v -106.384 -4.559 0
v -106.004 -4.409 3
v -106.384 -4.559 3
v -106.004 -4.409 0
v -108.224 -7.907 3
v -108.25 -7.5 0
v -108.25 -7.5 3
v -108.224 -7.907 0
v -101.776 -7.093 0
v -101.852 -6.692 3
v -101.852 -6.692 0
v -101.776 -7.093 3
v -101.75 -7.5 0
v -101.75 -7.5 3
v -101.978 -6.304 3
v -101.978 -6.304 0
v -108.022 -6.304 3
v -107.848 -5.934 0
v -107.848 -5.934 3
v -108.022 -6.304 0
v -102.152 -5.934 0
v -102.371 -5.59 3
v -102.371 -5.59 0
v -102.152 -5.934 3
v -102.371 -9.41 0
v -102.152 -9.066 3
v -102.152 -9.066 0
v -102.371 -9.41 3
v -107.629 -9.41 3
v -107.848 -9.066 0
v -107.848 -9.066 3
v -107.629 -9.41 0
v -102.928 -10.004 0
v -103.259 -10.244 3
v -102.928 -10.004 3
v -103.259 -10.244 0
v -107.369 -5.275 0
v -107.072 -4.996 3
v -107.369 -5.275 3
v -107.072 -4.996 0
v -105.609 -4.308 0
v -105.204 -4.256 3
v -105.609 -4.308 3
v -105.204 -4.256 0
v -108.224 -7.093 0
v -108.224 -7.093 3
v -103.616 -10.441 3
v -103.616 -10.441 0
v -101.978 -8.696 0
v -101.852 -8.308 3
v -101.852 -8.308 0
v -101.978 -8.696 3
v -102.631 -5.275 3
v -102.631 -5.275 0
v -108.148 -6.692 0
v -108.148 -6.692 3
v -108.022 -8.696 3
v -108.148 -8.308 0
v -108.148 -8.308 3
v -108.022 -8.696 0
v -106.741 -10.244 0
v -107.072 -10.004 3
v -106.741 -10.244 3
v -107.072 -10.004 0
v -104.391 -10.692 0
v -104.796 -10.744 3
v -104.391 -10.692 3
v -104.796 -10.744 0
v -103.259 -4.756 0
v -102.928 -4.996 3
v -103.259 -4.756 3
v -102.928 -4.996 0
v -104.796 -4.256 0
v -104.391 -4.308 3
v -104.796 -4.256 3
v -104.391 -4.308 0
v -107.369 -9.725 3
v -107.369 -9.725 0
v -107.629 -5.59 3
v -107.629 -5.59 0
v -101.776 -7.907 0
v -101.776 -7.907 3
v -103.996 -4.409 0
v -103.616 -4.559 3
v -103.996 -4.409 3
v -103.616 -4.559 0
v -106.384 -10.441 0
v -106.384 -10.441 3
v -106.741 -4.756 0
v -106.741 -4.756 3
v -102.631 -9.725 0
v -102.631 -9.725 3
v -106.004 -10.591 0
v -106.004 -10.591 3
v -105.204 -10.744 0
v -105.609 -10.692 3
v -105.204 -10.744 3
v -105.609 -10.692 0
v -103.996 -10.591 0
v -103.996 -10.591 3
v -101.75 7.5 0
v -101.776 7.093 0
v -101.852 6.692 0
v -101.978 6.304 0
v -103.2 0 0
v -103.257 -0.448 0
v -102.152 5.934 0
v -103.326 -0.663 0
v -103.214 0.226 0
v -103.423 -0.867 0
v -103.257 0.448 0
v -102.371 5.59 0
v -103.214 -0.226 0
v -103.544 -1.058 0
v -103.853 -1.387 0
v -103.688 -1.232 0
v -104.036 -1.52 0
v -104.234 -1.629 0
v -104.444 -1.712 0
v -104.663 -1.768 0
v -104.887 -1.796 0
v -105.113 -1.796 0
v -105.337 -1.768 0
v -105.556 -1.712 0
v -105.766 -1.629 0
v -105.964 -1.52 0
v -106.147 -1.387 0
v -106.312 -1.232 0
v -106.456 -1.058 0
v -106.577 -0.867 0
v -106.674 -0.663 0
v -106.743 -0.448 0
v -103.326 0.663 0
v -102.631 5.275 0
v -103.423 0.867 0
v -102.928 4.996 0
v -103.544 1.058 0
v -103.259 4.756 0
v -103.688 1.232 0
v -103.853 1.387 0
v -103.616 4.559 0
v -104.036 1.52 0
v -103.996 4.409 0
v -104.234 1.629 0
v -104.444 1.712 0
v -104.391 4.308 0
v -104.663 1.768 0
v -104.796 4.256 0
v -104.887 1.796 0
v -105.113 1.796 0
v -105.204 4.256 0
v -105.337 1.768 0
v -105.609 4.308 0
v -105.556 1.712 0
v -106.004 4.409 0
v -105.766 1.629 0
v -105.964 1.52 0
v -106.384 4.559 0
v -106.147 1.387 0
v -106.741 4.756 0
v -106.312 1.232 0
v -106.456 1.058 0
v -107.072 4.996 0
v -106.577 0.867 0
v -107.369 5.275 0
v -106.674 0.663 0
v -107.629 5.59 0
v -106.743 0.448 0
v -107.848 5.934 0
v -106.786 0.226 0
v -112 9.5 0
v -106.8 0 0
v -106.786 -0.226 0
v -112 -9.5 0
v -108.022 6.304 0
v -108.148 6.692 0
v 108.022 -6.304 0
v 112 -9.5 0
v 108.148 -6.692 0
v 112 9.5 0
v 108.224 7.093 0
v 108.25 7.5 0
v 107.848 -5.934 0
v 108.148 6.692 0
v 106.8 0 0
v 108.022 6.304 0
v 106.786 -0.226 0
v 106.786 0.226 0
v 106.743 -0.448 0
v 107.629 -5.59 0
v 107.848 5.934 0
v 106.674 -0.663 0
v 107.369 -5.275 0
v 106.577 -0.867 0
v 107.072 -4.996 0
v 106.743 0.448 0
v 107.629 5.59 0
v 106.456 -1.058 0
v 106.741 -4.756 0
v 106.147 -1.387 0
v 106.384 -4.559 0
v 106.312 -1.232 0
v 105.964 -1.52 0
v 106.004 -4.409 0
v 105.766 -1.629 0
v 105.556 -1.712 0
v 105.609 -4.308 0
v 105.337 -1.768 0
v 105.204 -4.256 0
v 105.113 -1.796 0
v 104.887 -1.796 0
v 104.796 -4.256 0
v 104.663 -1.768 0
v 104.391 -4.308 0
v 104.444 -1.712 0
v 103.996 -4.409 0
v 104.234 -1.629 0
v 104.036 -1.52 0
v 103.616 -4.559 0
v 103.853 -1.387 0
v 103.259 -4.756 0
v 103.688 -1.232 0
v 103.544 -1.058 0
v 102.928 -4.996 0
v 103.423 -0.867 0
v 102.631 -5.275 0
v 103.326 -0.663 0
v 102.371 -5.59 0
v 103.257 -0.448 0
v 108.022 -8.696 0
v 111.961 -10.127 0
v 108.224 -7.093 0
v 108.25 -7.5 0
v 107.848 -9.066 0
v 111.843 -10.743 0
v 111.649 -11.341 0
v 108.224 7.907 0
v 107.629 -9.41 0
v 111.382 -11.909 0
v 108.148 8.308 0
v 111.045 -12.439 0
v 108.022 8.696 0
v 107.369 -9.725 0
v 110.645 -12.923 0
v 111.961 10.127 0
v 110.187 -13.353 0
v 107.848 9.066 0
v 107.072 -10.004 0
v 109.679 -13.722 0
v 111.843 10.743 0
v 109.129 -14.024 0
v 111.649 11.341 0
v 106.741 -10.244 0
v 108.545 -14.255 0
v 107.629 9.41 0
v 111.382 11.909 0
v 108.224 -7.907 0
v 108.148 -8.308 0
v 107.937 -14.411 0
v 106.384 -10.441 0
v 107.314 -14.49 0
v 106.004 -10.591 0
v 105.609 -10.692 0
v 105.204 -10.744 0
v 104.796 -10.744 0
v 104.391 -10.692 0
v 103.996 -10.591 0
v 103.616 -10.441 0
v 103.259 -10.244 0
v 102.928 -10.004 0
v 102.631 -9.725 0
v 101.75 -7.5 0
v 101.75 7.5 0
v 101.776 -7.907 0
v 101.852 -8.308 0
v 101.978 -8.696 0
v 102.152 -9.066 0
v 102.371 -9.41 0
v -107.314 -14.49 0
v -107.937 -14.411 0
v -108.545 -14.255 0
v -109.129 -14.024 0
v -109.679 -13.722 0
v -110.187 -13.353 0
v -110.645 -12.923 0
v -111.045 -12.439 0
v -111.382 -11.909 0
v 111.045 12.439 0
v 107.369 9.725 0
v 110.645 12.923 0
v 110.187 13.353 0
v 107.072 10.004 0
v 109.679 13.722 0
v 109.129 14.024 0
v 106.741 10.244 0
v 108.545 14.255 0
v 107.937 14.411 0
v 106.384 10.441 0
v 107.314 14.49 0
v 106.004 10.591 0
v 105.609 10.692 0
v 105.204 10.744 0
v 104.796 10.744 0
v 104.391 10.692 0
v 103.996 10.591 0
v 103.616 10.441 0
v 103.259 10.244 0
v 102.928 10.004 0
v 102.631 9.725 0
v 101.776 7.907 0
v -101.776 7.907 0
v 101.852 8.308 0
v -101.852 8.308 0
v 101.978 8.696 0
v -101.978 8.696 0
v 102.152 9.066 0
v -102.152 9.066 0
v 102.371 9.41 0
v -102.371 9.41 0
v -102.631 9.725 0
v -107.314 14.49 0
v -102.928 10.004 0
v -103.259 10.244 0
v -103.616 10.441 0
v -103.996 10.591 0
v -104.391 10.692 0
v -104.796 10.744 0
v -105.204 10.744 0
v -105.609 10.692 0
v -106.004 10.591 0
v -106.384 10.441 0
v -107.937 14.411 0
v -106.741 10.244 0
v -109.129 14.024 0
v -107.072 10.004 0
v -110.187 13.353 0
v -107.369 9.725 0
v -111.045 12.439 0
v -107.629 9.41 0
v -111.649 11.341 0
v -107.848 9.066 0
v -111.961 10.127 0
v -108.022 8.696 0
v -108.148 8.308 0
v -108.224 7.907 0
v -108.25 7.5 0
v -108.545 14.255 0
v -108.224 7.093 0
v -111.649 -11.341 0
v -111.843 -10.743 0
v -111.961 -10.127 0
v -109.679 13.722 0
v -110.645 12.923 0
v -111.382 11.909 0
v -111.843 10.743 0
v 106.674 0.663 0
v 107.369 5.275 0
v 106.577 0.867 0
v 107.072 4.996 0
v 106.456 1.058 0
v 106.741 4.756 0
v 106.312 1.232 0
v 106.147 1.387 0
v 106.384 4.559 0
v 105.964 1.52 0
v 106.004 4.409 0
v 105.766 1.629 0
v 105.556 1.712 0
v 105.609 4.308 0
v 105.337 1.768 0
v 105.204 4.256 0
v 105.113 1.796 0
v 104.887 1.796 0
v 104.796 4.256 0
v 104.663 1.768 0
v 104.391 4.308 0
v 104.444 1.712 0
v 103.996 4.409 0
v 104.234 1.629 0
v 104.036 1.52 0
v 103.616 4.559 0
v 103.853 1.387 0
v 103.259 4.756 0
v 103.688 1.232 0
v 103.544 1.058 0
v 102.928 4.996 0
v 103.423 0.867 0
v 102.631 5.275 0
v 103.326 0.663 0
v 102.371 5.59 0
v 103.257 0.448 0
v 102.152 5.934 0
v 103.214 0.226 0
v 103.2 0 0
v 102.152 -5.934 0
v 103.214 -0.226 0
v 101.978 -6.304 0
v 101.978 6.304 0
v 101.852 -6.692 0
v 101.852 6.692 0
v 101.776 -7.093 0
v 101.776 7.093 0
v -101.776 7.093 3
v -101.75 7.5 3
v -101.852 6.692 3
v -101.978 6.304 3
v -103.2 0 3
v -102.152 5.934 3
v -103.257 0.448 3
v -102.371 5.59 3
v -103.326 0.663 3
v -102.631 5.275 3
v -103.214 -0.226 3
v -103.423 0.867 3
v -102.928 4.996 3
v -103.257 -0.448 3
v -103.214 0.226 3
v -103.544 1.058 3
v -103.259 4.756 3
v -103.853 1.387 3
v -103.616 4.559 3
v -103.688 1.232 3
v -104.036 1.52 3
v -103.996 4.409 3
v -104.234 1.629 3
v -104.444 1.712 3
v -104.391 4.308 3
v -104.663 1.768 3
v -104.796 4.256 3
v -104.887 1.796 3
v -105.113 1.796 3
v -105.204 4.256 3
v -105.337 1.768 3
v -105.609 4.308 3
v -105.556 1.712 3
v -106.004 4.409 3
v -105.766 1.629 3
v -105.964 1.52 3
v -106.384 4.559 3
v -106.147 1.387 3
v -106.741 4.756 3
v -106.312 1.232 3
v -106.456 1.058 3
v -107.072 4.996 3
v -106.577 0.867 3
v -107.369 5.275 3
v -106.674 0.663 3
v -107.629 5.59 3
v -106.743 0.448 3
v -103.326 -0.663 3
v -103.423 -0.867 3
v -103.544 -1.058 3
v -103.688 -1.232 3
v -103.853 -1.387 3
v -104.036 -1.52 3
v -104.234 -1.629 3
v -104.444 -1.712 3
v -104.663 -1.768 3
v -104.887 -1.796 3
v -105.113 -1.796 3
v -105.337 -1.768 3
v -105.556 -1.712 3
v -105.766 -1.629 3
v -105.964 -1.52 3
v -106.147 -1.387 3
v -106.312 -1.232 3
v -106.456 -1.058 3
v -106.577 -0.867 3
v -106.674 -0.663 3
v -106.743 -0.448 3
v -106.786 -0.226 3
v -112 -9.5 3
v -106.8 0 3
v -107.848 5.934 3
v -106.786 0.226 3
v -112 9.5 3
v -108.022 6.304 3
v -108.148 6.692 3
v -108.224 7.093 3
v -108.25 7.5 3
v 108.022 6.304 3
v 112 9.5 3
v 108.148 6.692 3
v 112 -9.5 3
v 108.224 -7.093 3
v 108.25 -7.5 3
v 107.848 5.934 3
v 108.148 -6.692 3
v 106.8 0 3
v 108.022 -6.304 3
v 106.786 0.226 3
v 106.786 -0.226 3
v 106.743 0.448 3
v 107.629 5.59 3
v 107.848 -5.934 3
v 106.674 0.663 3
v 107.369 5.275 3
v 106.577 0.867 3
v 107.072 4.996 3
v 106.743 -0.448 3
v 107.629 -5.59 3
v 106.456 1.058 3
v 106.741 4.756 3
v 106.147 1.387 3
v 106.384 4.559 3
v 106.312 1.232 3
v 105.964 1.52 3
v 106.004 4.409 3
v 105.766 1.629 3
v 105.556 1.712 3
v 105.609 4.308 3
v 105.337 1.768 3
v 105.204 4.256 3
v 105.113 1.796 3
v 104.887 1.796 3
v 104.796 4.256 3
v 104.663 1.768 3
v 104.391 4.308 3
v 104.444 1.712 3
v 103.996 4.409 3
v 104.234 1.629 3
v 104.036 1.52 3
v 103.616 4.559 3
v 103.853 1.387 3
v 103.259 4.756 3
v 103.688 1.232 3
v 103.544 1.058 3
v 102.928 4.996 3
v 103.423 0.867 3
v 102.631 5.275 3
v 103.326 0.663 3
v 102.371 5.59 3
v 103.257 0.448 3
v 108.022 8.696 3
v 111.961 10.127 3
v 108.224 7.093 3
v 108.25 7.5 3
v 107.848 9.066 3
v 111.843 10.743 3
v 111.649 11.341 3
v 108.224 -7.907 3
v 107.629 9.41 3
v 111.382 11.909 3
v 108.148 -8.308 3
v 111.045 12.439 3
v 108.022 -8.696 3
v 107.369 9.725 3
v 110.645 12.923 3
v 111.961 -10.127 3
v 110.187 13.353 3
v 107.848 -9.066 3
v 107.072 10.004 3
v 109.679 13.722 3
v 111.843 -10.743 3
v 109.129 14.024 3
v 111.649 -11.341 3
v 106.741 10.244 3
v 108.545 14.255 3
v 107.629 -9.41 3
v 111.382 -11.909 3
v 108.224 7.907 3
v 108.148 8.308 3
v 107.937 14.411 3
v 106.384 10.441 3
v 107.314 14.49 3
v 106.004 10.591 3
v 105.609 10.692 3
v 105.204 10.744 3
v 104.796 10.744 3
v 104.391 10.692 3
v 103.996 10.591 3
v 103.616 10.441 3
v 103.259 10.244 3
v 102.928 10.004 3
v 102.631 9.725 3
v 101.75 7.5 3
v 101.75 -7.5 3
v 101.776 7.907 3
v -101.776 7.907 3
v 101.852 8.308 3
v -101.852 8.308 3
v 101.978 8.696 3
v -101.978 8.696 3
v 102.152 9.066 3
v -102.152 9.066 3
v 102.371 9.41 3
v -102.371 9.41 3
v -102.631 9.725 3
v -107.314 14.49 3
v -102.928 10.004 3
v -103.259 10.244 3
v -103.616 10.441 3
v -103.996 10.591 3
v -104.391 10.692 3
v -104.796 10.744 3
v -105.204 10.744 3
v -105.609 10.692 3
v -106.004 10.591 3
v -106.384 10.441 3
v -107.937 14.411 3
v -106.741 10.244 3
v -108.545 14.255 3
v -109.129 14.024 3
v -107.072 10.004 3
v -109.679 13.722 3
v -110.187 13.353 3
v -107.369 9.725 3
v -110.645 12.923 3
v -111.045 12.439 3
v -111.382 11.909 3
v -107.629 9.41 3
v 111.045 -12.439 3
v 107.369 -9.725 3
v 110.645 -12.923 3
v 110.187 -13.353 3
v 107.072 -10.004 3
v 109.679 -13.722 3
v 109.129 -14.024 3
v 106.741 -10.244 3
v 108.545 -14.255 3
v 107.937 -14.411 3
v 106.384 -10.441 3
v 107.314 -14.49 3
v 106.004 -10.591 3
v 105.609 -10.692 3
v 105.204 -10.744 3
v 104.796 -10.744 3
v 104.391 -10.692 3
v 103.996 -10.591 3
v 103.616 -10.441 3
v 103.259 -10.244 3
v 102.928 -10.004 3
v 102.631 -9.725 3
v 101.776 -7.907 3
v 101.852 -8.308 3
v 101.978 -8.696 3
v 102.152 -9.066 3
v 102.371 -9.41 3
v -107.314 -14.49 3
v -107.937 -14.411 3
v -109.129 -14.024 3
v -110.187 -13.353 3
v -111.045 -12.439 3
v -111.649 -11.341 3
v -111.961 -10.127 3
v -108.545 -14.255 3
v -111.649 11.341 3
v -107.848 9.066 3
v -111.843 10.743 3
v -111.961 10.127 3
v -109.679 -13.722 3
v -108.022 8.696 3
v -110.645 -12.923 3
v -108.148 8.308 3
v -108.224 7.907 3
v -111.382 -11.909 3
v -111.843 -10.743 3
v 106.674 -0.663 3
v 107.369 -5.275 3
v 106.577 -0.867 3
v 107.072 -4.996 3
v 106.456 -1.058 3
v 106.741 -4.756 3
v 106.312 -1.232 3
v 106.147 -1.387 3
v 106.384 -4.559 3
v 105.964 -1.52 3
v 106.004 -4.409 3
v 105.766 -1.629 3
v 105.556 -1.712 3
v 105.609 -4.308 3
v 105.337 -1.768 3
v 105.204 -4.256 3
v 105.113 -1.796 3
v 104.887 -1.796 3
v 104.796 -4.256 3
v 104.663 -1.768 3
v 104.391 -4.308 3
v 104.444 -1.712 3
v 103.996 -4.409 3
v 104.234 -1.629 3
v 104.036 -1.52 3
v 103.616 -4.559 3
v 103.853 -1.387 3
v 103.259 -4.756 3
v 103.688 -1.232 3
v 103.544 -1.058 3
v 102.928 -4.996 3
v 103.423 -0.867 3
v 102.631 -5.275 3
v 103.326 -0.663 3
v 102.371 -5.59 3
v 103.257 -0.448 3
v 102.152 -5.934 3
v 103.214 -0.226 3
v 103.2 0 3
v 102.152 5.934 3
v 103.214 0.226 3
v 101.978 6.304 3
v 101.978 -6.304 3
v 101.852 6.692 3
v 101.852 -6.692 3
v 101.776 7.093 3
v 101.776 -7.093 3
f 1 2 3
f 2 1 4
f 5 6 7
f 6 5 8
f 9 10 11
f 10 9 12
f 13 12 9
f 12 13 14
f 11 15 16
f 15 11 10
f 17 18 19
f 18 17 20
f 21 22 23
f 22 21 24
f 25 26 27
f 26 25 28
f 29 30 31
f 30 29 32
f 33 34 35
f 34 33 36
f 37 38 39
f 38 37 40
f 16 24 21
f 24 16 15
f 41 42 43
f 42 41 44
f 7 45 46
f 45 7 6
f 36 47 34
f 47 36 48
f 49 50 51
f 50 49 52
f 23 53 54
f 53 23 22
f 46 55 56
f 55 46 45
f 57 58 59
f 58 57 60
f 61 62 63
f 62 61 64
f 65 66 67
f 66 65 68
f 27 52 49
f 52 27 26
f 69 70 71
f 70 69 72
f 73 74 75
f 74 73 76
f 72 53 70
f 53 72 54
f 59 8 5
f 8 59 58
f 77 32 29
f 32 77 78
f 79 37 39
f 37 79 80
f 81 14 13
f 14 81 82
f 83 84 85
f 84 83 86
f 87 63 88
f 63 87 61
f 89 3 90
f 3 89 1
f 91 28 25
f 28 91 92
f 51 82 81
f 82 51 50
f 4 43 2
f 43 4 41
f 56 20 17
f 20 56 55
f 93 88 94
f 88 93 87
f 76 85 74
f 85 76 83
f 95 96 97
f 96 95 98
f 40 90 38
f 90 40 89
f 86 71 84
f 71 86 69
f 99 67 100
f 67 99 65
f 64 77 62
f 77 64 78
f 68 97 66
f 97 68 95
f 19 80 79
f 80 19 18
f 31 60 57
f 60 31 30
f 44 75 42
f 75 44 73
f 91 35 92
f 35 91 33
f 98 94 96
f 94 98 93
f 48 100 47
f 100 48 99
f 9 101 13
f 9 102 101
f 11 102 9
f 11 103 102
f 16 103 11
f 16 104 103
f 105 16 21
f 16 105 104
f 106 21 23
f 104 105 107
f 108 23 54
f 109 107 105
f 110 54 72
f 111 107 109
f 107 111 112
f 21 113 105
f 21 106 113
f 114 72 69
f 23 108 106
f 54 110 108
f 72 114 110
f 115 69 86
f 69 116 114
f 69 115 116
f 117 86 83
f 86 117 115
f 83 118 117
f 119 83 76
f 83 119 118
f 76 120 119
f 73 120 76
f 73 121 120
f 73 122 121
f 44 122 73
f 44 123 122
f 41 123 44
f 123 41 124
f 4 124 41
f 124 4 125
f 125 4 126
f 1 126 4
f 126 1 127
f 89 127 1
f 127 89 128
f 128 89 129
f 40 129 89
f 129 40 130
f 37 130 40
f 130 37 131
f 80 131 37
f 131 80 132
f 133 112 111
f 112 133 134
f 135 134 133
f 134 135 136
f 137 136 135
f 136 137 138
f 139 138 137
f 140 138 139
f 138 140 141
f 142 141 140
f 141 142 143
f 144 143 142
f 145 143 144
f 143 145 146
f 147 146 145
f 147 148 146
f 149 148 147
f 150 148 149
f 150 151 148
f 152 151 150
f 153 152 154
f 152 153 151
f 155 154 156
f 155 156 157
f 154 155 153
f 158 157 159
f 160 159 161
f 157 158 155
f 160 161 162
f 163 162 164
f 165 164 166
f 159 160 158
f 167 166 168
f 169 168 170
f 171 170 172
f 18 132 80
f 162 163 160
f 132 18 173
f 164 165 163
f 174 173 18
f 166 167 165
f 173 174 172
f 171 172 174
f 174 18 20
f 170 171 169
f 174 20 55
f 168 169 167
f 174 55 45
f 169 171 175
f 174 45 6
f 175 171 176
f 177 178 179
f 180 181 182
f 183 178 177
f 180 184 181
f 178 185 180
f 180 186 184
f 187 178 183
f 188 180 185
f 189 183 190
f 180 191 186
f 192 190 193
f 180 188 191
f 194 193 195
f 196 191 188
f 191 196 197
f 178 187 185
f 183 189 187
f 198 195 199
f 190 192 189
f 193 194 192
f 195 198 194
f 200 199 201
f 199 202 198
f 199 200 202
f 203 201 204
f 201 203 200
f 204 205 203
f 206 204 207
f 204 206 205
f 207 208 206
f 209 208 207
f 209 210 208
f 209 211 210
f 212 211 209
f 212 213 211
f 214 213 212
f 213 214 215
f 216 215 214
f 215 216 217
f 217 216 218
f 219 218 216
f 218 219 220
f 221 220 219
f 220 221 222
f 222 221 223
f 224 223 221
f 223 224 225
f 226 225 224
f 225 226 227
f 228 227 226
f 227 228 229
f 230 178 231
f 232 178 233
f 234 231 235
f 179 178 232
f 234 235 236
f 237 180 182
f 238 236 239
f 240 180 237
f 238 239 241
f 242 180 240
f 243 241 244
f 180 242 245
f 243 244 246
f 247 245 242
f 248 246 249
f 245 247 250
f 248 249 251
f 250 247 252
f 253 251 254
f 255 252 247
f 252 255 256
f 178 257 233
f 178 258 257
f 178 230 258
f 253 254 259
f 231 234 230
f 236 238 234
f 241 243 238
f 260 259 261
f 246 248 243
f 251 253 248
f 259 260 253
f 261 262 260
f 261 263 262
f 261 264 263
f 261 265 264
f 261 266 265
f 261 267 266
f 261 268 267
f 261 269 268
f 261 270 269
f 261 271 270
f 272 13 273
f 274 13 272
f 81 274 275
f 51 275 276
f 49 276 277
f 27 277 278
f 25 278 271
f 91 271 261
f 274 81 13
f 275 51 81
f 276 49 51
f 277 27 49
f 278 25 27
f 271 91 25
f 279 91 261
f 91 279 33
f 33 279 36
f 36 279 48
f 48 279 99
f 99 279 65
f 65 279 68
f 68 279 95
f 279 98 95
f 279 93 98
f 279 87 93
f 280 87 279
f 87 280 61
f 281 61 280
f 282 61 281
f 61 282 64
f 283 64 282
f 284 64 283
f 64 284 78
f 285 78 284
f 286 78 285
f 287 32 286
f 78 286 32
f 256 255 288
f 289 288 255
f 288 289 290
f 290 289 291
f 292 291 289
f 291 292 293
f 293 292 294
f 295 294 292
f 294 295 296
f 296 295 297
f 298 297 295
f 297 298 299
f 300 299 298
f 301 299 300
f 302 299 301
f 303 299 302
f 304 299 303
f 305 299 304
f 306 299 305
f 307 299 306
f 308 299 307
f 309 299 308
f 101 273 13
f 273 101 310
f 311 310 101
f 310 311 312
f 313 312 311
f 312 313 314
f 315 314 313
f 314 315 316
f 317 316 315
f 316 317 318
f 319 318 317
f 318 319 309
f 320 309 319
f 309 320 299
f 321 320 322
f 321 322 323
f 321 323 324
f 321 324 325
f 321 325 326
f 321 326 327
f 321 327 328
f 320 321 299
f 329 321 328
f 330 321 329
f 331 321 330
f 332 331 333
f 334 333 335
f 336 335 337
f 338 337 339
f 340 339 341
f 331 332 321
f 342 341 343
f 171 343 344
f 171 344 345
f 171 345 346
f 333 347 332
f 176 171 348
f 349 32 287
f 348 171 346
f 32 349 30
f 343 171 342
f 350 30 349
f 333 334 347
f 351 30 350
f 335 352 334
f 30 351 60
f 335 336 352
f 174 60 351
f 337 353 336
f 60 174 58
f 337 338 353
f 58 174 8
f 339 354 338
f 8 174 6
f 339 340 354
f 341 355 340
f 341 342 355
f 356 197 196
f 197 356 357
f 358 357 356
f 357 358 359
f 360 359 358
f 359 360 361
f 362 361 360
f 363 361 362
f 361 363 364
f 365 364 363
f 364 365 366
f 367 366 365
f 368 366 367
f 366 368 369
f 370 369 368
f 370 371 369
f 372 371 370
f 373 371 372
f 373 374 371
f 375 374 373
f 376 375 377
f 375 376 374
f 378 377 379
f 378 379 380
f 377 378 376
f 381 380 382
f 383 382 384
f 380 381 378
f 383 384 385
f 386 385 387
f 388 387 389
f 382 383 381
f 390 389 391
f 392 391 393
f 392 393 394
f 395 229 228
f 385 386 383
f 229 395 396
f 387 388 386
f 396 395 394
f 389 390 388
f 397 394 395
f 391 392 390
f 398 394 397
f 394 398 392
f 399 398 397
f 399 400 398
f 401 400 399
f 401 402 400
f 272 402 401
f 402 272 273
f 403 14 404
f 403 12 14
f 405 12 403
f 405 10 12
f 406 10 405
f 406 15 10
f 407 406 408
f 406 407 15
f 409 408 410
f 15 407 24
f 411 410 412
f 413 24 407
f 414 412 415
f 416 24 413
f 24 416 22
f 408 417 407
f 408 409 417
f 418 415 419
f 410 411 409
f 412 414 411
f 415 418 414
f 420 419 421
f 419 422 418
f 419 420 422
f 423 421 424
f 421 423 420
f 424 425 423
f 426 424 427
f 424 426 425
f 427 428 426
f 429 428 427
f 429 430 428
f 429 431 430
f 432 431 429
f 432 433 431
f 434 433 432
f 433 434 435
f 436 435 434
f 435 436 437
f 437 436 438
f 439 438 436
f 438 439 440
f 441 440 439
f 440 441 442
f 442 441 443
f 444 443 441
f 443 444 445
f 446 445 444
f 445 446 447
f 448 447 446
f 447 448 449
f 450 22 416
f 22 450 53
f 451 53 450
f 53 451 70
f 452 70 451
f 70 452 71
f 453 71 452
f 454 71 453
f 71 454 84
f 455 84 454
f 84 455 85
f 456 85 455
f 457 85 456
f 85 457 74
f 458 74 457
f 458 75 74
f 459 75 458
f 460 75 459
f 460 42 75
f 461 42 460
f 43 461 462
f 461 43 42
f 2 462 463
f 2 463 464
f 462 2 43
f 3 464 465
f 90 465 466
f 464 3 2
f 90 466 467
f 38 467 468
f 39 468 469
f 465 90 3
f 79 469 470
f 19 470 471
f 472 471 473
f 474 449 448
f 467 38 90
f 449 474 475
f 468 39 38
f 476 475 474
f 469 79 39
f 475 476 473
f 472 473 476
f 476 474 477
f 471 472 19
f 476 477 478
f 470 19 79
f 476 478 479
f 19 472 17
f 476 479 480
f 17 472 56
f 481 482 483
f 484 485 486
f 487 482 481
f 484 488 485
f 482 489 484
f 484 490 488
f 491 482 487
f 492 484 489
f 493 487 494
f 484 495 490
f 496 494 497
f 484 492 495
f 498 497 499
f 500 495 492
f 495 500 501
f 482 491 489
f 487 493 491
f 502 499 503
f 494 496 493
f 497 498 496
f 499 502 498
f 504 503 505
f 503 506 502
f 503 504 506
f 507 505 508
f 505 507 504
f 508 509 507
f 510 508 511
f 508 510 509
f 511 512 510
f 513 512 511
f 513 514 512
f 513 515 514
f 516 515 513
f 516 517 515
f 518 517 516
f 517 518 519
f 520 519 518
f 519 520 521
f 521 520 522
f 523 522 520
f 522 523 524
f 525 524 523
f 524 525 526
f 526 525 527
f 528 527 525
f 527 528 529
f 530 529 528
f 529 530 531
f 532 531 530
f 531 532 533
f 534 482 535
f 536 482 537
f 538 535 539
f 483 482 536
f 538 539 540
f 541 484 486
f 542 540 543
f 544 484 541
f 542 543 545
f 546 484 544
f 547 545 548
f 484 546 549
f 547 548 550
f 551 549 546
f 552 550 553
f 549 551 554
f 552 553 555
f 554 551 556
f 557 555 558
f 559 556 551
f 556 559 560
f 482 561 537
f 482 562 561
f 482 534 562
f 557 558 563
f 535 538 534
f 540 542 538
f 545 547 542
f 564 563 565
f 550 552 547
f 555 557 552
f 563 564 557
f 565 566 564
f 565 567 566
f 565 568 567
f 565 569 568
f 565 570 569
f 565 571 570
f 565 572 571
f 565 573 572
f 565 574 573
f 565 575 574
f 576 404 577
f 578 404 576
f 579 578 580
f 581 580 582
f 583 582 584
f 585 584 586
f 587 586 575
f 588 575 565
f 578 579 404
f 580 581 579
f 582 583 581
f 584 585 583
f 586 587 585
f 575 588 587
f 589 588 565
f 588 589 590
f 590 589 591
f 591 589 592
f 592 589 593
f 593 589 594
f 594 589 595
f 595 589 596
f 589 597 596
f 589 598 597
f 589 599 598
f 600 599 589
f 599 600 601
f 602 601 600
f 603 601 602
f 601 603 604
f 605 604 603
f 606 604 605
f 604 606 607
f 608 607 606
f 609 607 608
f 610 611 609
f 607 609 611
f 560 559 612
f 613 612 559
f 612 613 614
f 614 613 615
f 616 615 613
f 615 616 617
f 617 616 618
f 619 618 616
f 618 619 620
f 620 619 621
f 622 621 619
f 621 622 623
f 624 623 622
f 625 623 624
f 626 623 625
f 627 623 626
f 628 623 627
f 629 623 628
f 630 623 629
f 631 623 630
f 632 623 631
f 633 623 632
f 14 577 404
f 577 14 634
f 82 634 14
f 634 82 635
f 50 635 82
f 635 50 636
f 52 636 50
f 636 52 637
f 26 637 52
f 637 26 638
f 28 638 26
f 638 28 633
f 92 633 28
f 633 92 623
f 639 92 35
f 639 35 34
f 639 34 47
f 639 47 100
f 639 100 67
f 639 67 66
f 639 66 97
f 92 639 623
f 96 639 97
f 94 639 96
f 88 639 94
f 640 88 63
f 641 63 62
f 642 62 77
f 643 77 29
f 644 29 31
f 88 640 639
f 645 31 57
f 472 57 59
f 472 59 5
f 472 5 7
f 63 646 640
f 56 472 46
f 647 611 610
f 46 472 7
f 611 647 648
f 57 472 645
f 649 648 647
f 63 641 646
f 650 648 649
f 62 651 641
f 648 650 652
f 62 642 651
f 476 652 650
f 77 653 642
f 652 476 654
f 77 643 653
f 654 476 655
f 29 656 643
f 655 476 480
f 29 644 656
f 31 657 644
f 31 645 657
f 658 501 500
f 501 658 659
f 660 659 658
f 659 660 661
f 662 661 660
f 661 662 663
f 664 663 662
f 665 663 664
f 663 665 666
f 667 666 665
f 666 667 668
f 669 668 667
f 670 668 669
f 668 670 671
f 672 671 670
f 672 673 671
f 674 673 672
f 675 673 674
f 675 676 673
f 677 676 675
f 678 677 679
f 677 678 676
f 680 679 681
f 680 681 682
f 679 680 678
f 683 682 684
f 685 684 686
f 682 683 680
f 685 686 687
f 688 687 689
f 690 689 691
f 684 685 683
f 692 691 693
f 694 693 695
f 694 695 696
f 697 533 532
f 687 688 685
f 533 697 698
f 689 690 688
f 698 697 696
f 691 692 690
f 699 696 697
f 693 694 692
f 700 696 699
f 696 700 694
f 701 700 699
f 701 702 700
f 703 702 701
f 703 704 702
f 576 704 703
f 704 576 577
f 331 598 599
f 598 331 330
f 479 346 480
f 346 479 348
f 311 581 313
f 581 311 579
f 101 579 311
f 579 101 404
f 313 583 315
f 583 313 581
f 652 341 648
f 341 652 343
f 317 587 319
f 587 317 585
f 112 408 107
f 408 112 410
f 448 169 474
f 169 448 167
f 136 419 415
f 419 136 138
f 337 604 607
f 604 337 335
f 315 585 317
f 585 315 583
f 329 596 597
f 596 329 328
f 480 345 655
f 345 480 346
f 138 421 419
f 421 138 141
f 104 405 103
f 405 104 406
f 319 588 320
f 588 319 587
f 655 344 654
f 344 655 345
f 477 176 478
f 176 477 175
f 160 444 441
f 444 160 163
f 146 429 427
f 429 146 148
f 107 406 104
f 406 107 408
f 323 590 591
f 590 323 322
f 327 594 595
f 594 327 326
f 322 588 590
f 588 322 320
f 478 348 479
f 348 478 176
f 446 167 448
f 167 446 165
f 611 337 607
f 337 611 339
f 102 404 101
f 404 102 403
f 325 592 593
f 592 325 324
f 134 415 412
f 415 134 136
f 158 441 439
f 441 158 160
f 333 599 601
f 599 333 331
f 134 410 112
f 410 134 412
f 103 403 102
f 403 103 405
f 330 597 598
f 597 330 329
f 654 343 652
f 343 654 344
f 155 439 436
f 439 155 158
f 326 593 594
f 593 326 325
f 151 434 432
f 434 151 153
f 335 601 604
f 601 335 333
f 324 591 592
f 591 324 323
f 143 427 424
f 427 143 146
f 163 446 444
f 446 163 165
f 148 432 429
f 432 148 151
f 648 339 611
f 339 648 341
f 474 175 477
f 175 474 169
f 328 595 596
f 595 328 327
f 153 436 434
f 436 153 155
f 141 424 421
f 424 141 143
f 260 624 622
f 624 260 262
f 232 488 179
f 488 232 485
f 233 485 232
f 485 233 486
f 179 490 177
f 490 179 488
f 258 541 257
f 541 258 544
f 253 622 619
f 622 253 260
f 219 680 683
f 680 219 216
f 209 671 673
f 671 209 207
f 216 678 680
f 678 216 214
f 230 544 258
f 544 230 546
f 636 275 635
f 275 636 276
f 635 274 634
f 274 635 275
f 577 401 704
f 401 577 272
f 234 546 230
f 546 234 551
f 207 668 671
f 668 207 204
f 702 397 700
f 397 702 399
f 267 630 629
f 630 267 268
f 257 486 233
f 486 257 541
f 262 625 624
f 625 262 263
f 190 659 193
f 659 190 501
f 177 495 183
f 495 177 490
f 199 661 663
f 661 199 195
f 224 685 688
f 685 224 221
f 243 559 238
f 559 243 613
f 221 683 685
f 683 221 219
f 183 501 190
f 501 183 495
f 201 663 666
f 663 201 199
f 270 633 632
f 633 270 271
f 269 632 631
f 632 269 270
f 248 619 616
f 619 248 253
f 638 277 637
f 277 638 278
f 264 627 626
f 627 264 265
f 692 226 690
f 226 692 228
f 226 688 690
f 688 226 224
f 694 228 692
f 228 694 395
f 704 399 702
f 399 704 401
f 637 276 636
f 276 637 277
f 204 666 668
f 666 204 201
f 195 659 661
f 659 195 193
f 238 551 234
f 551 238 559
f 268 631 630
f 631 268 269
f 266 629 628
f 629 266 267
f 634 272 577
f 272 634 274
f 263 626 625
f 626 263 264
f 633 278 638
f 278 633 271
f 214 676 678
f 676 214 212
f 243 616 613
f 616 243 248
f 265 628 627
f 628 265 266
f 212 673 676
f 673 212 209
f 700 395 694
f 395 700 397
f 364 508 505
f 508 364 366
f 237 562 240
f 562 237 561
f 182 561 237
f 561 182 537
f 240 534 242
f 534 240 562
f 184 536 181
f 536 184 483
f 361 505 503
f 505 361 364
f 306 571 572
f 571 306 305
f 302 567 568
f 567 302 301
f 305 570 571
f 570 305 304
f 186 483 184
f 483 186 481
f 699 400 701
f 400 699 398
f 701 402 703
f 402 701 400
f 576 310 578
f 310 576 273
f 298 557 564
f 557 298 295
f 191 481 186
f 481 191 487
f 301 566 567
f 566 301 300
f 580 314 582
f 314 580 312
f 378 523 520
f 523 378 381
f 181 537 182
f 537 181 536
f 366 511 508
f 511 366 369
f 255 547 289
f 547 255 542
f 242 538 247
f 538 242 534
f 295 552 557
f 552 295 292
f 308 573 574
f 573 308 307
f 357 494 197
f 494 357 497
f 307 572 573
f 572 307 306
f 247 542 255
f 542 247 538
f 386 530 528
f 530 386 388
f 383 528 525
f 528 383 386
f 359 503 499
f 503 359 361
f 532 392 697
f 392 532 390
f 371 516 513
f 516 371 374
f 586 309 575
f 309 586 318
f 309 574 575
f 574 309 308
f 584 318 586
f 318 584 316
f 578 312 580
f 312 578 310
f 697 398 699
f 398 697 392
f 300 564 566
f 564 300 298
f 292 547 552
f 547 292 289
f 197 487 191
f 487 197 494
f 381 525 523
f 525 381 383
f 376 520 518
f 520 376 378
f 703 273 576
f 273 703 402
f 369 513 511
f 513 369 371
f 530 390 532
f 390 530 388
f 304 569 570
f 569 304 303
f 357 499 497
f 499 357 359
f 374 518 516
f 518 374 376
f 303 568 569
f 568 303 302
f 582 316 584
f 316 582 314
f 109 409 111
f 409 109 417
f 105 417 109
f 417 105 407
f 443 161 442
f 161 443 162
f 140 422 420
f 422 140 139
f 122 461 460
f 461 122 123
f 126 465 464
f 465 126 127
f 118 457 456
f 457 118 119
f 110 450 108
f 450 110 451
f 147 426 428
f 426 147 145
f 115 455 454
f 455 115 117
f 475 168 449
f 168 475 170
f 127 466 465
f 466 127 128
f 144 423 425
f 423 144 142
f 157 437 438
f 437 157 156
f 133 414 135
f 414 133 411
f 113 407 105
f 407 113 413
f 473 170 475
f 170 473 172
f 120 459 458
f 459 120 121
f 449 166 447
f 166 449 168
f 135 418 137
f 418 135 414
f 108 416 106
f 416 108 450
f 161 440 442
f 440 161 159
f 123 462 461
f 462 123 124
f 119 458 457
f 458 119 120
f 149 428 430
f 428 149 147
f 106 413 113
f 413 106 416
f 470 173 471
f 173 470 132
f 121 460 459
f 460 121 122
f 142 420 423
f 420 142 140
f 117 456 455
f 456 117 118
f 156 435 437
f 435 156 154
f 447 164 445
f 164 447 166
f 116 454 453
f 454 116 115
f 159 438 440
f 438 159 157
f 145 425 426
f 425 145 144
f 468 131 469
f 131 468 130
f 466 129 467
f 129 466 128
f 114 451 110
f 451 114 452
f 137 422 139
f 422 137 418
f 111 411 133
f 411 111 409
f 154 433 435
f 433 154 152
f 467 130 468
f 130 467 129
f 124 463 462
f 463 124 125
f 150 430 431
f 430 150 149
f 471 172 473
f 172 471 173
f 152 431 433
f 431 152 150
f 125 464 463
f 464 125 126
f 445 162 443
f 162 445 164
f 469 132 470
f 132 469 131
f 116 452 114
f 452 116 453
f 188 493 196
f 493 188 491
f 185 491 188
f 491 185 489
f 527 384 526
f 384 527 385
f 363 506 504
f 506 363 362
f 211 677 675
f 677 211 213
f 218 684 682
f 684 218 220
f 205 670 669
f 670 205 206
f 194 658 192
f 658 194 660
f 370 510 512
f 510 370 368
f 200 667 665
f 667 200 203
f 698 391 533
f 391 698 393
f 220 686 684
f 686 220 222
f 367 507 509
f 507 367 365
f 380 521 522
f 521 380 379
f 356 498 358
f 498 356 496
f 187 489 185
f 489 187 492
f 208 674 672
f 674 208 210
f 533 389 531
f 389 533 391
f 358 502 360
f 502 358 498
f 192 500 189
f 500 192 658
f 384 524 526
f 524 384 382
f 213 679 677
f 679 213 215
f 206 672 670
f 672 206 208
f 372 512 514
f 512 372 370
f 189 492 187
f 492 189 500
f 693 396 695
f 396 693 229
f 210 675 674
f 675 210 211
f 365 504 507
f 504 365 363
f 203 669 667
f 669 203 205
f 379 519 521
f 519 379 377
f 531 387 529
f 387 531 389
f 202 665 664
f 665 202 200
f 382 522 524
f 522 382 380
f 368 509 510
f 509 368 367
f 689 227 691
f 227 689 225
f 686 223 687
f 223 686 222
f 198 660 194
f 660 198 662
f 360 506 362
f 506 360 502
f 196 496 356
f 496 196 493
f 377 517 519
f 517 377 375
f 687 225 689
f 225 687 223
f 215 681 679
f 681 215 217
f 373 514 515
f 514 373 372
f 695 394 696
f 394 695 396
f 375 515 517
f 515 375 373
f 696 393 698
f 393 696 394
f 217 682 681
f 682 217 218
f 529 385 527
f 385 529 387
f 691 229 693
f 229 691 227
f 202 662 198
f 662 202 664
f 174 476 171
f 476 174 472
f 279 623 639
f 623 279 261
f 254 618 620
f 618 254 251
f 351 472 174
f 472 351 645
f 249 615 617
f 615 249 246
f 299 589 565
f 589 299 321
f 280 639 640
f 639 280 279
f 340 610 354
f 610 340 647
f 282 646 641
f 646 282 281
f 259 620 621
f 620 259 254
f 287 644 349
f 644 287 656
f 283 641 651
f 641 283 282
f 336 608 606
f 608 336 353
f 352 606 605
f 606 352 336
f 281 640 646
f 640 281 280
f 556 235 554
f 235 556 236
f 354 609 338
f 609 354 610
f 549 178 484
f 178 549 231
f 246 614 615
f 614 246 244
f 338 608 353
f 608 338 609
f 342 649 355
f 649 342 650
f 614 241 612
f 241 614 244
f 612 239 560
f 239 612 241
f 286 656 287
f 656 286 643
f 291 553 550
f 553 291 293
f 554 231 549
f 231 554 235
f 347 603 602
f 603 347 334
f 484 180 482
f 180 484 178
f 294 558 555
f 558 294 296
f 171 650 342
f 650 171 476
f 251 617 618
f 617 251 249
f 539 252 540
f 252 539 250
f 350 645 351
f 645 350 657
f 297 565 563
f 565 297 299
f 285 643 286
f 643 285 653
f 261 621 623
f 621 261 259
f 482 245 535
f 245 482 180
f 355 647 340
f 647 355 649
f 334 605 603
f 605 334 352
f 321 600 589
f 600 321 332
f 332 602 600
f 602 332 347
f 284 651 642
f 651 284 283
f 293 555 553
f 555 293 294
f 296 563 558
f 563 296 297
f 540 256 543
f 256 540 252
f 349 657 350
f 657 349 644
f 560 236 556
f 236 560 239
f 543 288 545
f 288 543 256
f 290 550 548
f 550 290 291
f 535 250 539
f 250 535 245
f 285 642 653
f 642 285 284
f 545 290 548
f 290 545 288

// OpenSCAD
$fn = 50;


difference() {
	union() {
		hull() {
			translate(v = [-107.0000000000, 9.5000000000, 0]) {
				cylinder(h = 3, r = 5);
			}
			translate(v = [107.0000000000, 9.5000000000, 0]) {
				cylinder(h = 3, r = 5);
			}
			translate(v = [-107.0000000000, -9.5000000000, 0]) {
				cylinder(h = 3, r = 5);
			}
			translate(v = [107.0000000000, -9.5000000000, 0]) {
				cylinder(h = 3, r = 5);
			}
		}
	}
	union() {
		translate(v = [-105.0000000000, -7.5000000000, 0]) {
			cylinder(h = 3, r = 3.2500000000);
		}
		translate(v = [-105.0000000000, 7.5000000000, 0]) {
			cylinder(h = 3, r = 3.2500000000);
		}
		translate(v = [105.0000000000, -7.5000000000, 0]) {
			cylinder(h = 3, r = 3.2500000000);
		}
		translate(v = [105.0000000000, 7.5000000000, 0]) {
			cylinder(h = 3, r = 3.2500000000);
		}
		translate(v = [-105.0000000000, -7.5000000000, 0]) {
			cylinder(h = 3, r = 1.8000000000);
		}
		translate(v = [-105.0000000000, 0.0000000000, 0]) {
			cylinder(h = 3, r = 1.8000000000);
		}
		translate(v = [-105.0000000000, 7.5000000000, 0]) {
			cylinder(h = 3, r = 1.8000000000);
		}
		translate(v = [105.0000000000, -7.5000000000, 0]) {
			cylinder(h = 3, r = 1.8000000000);
		}
		translate(v = [105.0000000000, 0.0000000000, 0]) {
			cylinder(h = 3, r = 1.8000000000);
		}
		translate(v = [105.0000000000, 7.5000000000, 0]) {
			cylinder(h = 3, r = 1.8000000000);
		}
		translate(v = [-105.0000000000, -7.5000000000, 0]) {
			cylinder(h = 3, r = 1.8000000000);
		}
		translate(v = [-105.0000000000, 0.0000000000, 0]) {
			cylinder(h = 3, r = 1.8000000000);
		}
		translate(v = [-105.0000000000, 7.5000000000, 0]) {
			cylinder(h = 3, r = 1.8000000000);
		}
		translate(v = [105.0000000000, -7.5000000000, 0]) {
			cylinder(h = 3, r = 1.8000000000);
		}
		translate(v = [105.0000000000, 0.0000000000, 0]) {
			cylinder(h = 3, r = 1.8000000000);
		}
		translate(v = [105.0000000000, 7.5000000000, 0]) {
			cylinder(h = 3, r = 1.8000000000);
		}
		translate(v = [-105.0000000000, -7.5000000000, 0]) {
			cylinder(h = 3, r = 1.8000000000);
		}
		translate(v = [-105.0000000000, 0.0000000000, 0]) {
			cylinder(h = 3, r = 1.8000000000);
		}
		translate(v = [-105.0000000000, 7.5000000000, 0]) {
			cylinder(h = 3, r = 1.8000000000);
		}
		translate(v = [105.0000000000, -7.5000000000, 0]) {
			cylinder(h = 3, r = 1.8000000000);
		}
		translate(v = [105.0000000000, 0.0000000000, 0]) {
			cylinder(h = 3, r = 1.8000000000);
		}
		translate(v = [105.0000000000, 7.5000000000, 0]) {
			cylinder(h = 3, r = 1.8000000000);
		}
	}
}
